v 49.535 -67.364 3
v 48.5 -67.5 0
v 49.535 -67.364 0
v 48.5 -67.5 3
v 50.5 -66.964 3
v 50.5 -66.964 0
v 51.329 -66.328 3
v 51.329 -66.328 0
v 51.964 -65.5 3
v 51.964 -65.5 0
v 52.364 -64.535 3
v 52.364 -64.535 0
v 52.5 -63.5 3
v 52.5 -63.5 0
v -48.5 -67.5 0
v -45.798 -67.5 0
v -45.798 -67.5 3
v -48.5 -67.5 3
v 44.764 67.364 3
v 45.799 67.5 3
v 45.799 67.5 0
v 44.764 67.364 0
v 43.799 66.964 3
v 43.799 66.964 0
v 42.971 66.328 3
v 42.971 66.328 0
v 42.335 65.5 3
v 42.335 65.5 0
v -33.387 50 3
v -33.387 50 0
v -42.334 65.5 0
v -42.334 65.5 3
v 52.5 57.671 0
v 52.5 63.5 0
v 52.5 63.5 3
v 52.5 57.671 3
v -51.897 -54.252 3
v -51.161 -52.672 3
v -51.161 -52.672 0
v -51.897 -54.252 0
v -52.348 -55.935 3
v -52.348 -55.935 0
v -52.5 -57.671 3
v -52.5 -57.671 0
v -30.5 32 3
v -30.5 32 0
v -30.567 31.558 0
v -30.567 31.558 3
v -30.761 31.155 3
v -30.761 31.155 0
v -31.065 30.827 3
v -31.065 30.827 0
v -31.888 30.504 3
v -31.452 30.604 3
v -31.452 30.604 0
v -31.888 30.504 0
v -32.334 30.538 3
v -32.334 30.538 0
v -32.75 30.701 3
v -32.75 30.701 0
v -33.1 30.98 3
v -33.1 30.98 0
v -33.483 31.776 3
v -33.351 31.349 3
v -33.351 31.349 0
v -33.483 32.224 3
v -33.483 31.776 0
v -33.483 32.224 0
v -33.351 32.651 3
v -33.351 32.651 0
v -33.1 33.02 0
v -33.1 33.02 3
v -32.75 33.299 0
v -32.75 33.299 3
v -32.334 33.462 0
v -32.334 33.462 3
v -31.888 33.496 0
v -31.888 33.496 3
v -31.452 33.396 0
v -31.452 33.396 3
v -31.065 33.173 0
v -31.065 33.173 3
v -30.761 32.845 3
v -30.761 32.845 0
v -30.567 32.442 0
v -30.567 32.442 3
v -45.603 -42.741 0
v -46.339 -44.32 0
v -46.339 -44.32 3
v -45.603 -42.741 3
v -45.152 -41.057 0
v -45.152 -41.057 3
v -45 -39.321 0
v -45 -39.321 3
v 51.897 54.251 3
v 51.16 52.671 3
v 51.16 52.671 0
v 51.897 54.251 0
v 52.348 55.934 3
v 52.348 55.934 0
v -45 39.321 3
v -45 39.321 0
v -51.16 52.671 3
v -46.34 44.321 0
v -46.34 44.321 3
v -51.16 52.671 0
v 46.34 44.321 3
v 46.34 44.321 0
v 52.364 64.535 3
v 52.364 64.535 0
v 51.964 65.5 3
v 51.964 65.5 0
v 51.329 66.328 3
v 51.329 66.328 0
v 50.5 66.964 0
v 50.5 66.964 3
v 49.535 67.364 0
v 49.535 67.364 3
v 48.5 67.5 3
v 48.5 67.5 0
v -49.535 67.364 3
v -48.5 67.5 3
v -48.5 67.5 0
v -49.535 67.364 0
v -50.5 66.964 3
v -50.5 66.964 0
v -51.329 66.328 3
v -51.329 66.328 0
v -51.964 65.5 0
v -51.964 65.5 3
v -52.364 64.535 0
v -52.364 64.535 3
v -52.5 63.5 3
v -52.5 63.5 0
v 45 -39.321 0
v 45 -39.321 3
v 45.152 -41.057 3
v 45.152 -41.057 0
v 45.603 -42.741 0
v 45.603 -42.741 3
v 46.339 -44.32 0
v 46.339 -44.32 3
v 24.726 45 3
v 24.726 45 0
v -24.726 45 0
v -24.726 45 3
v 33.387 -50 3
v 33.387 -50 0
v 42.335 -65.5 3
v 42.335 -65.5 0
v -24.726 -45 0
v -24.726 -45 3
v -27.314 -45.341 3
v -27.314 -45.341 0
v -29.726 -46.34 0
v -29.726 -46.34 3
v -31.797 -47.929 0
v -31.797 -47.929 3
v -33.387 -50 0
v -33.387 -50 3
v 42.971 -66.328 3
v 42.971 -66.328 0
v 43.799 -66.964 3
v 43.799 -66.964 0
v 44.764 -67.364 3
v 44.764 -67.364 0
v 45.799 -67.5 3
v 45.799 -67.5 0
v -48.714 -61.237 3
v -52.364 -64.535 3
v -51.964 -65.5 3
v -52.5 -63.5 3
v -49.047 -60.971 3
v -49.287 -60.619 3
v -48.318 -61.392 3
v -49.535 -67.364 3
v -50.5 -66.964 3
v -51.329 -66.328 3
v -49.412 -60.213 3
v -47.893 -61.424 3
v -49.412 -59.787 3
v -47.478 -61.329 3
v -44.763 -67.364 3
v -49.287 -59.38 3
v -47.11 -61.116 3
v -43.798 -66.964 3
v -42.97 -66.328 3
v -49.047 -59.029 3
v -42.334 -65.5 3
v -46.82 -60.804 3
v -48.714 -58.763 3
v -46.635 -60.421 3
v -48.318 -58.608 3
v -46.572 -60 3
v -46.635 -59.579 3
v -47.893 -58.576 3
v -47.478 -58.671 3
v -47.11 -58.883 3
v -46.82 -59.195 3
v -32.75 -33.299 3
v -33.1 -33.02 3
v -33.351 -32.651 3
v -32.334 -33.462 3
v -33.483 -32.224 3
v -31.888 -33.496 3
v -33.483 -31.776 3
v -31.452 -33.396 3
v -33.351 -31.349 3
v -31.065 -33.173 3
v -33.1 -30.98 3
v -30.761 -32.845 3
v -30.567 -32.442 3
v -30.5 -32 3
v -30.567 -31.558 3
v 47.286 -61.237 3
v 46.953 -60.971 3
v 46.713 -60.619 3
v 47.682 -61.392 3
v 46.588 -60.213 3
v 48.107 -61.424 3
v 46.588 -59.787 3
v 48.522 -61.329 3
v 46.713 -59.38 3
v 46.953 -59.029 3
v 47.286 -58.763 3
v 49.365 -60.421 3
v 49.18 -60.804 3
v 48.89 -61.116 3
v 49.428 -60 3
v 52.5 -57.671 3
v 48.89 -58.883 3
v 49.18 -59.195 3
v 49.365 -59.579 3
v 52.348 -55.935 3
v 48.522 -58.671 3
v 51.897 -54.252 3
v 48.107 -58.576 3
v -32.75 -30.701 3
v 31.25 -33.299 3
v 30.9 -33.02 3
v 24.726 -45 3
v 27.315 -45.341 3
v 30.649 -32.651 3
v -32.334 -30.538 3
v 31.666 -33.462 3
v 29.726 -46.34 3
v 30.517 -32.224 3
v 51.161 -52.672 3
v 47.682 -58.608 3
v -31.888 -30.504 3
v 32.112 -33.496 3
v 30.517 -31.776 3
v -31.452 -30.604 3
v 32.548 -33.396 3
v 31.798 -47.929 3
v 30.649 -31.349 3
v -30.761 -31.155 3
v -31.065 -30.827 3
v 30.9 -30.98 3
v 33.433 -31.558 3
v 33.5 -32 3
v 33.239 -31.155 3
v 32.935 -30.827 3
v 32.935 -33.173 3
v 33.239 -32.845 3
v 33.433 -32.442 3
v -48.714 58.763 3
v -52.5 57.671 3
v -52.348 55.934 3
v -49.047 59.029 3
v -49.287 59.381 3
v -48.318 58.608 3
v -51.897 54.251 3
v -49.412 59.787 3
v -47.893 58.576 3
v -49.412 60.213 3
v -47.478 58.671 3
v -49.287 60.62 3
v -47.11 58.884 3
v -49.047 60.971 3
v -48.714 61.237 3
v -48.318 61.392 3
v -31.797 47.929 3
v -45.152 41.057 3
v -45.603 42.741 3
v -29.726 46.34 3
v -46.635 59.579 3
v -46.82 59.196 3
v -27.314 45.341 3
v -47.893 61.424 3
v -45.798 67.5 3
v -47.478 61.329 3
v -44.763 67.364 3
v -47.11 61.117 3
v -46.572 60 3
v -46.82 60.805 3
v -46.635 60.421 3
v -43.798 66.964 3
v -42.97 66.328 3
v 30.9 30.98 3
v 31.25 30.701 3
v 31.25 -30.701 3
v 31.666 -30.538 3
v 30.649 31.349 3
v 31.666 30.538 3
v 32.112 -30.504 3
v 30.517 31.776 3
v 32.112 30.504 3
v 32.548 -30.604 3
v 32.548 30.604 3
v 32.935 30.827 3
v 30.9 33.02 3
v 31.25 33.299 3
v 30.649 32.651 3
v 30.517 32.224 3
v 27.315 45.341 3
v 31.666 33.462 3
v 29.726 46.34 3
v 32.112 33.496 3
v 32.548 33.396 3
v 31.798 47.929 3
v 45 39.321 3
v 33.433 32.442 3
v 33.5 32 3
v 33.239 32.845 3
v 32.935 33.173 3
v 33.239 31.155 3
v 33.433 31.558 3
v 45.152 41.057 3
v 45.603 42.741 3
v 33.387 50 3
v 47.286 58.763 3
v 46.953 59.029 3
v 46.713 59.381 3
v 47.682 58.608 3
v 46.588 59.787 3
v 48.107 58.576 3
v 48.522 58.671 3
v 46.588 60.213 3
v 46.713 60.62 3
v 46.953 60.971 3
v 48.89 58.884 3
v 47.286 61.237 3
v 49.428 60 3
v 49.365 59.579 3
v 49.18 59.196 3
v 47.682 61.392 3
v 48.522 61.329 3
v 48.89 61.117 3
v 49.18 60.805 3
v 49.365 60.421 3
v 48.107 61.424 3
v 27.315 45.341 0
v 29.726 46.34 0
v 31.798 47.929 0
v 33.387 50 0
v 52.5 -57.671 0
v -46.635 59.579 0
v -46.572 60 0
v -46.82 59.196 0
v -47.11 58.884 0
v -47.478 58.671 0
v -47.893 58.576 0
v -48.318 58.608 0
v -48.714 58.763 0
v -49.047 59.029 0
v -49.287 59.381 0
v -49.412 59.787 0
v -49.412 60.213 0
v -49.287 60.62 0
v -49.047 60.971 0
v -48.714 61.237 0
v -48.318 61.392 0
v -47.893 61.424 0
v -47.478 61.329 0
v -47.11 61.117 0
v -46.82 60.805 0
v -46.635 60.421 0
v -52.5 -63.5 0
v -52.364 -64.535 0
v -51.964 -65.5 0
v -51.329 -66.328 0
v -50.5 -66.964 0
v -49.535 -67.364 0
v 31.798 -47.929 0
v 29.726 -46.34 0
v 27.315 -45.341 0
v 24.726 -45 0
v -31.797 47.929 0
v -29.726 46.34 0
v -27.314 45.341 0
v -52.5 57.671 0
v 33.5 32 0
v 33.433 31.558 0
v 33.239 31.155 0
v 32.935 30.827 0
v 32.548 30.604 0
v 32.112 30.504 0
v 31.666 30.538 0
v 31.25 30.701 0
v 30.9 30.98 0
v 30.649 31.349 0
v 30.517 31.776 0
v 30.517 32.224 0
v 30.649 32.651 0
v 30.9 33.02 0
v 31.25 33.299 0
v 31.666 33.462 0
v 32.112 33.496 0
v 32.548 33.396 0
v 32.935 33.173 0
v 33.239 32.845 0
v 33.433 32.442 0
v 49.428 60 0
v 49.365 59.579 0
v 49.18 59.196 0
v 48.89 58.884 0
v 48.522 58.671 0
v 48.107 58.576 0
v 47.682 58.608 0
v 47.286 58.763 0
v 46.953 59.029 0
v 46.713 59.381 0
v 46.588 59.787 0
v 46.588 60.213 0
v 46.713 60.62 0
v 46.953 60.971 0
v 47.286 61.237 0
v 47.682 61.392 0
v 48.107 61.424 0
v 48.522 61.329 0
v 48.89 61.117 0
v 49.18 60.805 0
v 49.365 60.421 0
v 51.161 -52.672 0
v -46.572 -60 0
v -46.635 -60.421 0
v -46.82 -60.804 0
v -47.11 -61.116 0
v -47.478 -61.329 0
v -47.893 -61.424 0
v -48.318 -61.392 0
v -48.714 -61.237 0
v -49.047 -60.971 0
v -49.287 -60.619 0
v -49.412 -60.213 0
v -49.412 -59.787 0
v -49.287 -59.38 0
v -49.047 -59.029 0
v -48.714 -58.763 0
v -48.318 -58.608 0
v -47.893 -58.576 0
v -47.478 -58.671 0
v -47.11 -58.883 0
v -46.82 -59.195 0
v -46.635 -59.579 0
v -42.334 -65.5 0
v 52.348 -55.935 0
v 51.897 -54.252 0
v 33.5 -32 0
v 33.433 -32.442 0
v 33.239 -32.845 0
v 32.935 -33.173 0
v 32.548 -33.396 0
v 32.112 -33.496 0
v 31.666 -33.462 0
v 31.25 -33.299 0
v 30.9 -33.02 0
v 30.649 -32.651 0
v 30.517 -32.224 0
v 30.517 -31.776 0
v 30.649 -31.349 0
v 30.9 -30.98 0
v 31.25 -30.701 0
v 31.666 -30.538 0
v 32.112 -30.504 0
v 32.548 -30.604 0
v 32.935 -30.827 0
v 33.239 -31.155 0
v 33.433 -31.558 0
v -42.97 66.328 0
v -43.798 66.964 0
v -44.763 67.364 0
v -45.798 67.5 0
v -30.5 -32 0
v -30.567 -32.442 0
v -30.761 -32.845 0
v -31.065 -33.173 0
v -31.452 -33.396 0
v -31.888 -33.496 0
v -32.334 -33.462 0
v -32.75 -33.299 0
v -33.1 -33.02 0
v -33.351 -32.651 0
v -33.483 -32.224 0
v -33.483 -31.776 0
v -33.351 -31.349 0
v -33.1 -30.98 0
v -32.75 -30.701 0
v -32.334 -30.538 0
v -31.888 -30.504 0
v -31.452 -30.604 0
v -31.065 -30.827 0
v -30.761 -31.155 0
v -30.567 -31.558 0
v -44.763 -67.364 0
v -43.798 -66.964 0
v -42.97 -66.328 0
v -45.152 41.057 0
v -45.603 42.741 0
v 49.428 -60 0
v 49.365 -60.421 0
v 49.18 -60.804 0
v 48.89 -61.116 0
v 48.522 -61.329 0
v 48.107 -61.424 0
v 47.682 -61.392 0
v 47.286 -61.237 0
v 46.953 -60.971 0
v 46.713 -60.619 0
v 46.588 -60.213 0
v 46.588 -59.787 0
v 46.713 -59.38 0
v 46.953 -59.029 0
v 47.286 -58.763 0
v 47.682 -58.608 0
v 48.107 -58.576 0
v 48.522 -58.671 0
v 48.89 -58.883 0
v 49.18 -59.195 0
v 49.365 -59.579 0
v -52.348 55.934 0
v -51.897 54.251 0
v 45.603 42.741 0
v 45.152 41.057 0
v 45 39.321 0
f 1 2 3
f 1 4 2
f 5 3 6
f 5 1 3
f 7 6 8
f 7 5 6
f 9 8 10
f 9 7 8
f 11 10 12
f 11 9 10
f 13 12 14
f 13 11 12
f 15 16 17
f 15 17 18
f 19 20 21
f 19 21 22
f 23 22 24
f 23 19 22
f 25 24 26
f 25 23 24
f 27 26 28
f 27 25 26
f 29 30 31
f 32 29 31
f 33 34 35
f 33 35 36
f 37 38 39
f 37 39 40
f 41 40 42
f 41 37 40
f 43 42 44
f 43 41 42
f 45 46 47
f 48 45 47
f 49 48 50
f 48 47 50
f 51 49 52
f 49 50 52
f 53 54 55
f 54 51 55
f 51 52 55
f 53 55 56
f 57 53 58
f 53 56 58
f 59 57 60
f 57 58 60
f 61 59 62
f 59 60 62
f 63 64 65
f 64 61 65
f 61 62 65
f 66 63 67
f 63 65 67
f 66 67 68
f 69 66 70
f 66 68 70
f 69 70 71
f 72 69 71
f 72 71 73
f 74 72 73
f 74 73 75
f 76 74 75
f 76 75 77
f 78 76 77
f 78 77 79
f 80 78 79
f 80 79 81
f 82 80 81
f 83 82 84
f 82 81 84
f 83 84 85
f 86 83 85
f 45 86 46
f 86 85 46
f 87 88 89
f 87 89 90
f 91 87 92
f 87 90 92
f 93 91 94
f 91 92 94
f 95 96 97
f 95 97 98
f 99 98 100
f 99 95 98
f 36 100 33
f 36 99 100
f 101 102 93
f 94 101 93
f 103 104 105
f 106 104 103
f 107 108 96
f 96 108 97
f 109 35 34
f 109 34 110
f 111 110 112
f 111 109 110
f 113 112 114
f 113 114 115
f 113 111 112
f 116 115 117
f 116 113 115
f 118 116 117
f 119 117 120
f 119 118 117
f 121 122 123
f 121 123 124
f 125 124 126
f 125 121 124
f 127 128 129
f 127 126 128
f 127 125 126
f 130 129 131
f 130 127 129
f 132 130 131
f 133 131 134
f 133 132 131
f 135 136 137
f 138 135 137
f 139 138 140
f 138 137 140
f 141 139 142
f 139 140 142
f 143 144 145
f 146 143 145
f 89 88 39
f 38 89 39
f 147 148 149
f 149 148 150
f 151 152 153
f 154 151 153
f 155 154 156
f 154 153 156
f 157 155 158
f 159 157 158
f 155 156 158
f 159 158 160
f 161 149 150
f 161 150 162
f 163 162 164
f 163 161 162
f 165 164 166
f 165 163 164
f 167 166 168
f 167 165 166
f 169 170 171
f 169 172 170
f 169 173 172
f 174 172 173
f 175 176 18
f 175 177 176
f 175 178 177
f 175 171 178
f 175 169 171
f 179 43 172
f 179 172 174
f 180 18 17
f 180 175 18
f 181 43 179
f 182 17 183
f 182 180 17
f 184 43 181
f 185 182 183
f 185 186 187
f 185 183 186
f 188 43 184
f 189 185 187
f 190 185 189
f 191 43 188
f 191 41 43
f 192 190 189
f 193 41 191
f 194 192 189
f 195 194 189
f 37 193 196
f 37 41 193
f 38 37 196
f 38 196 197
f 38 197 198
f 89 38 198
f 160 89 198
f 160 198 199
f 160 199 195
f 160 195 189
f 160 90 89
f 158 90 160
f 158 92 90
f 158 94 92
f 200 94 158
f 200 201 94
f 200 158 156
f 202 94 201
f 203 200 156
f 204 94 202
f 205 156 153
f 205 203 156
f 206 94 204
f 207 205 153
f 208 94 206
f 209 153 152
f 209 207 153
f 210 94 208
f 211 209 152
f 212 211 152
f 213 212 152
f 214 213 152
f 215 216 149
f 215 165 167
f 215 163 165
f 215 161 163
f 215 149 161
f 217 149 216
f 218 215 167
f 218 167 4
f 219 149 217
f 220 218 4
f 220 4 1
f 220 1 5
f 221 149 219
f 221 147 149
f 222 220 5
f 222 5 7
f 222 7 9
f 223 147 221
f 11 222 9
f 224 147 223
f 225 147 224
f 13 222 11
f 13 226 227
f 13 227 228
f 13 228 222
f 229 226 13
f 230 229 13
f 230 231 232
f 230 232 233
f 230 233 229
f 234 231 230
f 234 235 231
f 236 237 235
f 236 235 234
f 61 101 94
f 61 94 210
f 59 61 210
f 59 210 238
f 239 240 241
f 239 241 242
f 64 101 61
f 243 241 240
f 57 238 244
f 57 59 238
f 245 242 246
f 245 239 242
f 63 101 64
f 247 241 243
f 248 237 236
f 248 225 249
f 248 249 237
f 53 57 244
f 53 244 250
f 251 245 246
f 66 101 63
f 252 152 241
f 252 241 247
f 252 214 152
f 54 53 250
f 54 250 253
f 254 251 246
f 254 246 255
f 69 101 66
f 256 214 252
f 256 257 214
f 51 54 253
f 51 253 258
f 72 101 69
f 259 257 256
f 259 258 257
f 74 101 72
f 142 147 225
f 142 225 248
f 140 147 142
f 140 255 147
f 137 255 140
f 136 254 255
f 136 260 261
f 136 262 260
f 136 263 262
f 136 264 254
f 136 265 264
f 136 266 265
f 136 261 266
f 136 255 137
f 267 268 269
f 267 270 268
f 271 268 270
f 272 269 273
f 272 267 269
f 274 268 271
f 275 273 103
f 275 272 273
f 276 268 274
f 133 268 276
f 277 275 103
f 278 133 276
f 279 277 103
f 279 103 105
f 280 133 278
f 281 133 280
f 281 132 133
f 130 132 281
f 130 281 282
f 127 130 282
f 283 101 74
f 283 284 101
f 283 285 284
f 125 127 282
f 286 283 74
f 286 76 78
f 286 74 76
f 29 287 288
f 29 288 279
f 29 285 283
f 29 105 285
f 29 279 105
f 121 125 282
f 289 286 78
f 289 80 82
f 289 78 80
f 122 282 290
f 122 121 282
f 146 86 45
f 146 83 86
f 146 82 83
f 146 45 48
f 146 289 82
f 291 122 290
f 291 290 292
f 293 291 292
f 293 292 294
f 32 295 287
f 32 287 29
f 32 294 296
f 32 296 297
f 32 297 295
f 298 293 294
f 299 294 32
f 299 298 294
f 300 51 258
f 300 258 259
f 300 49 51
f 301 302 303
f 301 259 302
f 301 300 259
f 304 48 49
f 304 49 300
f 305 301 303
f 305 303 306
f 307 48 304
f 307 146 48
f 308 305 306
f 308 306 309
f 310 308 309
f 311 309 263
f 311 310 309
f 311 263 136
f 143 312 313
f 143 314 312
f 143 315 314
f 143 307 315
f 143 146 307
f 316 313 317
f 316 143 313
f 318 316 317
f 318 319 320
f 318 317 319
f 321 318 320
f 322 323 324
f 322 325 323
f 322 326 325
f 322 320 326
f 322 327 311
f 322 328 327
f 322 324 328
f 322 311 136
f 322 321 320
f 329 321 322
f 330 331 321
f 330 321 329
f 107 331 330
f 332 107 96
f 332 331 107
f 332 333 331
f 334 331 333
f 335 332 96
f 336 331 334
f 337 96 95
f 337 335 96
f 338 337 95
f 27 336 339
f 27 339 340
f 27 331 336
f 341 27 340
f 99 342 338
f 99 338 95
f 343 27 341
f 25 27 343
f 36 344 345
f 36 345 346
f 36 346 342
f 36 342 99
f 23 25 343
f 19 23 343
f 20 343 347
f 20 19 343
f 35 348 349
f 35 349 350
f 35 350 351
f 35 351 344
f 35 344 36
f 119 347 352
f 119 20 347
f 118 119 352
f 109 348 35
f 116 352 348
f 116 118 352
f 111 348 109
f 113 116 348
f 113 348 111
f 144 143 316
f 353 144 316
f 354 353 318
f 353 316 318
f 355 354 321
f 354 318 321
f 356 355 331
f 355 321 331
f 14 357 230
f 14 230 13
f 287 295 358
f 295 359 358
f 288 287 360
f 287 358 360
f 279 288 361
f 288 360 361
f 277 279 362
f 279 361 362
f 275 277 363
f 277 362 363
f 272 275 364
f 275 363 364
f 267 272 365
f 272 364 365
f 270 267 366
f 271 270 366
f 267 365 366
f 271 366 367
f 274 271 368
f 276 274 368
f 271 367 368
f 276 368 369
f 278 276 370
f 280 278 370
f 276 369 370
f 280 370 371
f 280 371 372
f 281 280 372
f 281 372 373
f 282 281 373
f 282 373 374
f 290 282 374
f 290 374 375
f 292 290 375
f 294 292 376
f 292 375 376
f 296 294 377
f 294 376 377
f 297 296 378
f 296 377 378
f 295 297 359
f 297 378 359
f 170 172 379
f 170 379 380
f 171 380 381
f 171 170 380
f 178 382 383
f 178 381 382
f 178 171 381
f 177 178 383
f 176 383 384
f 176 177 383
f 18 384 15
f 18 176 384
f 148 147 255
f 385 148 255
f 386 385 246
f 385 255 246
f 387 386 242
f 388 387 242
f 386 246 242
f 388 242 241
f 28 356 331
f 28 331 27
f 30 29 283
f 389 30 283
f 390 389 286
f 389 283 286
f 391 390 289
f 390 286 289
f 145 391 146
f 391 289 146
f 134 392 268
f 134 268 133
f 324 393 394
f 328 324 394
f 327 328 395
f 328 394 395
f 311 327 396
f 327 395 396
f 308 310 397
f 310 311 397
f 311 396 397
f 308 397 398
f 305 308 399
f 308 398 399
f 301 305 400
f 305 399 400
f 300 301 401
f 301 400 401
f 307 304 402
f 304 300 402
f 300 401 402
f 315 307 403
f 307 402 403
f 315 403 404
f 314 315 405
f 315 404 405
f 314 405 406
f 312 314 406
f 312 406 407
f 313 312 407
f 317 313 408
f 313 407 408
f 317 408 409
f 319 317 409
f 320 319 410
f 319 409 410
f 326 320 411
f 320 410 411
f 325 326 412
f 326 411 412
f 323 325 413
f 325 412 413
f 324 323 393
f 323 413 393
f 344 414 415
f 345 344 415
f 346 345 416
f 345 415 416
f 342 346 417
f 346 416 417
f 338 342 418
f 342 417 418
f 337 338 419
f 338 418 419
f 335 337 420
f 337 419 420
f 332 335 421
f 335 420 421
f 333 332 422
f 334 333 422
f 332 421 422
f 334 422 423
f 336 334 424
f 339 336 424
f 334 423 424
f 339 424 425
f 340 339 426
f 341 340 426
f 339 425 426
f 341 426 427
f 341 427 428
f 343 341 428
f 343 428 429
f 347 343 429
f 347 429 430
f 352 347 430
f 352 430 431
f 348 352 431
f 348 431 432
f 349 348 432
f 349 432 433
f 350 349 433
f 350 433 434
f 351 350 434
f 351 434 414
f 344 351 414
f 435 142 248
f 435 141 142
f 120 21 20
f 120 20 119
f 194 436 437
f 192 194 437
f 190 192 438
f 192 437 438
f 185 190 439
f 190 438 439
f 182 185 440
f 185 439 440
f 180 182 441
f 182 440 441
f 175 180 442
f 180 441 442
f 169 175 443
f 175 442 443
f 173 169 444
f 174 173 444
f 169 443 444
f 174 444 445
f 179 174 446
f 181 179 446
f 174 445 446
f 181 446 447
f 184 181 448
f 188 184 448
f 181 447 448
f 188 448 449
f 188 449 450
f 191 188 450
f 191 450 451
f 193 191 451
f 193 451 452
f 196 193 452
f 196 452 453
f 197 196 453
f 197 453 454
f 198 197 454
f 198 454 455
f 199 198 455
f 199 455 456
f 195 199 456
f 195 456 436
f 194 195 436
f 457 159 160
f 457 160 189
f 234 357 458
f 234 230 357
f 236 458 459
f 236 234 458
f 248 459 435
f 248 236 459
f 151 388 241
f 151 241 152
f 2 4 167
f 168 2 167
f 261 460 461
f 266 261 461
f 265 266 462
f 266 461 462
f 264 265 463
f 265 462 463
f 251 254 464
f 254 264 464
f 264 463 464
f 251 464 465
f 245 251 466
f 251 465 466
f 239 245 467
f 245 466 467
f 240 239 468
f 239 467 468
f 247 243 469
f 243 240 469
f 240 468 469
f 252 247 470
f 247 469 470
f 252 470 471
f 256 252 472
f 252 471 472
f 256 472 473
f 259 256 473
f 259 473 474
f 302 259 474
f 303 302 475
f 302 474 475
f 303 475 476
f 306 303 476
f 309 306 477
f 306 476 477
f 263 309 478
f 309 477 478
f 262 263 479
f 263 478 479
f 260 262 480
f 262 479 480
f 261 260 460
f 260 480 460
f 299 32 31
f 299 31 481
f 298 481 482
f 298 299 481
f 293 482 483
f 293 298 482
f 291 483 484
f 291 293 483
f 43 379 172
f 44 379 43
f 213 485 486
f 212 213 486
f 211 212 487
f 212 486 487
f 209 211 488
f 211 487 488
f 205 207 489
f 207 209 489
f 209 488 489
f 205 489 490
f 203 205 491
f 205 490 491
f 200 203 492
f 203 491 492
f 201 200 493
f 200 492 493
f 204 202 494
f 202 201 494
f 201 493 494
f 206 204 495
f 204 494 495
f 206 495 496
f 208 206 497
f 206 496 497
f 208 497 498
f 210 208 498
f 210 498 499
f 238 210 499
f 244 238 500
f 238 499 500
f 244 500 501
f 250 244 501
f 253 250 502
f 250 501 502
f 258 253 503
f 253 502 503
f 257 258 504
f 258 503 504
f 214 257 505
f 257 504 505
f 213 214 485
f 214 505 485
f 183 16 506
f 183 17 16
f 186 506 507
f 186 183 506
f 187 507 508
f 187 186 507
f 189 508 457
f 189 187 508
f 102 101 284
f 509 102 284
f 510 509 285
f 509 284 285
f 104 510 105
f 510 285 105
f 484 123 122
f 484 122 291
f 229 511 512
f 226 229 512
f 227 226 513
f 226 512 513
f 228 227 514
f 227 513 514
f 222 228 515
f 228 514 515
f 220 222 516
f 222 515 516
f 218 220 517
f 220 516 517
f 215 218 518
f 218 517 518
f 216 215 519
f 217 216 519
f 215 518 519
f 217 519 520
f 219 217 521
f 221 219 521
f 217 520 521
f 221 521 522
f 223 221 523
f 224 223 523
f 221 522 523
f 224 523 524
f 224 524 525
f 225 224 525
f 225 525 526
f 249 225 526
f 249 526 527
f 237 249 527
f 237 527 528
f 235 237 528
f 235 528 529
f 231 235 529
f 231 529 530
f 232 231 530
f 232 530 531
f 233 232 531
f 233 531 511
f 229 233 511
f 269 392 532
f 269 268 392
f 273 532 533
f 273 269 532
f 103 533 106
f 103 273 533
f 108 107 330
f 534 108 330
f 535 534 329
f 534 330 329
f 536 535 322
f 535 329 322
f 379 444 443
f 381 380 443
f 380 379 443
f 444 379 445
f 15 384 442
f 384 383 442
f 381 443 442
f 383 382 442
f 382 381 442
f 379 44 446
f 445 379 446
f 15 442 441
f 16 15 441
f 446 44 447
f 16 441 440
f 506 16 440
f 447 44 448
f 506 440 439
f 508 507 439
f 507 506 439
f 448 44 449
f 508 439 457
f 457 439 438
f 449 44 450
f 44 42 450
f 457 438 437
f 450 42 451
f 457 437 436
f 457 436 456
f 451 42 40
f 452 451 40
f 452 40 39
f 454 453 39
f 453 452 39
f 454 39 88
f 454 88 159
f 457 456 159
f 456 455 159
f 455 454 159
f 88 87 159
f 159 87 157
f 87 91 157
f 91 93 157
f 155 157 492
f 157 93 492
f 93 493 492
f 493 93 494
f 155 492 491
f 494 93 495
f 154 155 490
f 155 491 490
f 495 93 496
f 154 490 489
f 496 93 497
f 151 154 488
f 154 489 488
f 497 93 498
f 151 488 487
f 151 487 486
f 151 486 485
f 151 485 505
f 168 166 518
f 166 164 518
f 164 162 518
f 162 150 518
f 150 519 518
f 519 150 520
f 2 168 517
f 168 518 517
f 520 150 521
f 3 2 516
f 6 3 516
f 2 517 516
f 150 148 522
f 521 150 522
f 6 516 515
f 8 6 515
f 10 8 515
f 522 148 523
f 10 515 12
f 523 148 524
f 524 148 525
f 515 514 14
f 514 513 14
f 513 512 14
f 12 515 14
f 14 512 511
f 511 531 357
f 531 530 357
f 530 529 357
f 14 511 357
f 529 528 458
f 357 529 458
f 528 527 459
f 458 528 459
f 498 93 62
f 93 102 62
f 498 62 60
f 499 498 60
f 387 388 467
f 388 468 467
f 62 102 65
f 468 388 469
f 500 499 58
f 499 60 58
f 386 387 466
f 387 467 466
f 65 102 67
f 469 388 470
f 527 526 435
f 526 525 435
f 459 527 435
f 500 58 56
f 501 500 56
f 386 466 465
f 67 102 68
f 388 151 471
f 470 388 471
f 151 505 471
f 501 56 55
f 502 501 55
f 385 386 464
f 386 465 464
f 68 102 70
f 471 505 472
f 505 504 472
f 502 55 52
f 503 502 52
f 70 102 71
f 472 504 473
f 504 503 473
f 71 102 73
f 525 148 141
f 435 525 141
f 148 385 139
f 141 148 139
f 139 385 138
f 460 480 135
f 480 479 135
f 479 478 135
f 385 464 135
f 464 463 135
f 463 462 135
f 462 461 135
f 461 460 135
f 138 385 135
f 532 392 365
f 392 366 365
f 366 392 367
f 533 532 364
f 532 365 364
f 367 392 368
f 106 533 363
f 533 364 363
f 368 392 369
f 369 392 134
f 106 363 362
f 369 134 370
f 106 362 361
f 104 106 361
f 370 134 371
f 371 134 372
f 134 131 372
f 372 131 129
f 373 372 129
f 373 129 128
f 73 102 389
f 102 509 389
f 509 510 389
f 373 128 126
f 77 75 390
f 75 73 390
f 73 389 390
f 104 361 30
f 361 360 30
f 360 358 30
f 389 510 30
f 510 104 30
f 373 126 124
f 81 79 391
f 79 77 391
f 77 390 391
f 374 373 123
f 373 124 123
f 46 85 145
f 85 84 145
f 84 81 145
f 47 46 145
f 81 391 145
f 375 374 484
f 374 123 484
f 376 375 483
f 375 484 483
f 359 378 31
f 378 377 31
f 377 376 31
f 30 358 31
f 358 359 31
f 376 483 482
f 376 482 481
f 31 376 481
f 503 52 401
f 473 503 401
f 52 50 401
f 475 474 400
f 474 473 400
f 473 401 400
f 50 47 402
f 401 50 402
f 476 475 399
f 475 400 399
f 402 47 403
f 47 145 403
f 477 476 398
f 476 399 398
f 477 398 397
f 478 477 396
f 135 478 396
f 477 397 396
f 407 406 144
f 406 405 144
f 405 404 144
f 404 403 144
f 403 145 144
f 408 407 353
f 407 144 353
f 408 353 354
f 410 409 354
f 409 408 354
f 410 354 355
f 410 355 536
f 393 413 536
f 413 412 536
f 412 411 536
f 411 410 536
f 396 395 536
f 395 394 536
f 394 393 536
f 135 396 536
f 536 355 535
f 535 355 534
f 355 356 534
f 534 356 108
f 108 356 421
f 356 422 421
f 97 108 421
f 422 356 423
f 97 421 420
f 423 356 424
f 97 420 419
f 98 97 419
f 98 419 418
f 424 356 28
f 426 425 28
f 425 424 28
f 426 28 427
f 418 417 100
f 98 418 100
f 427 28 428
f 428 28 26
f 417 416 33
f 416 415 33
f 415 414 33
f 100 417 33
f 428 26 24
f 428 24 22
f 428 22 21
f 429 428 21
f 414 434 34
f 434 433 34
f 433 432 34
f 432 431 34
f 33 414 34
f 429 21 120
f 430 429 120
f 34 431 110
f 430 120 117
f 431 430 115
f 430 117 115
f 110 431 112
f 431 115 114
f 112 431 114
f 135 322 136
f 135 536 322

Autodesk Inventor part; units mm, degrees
ref_plane "YZ Plane" through (0, 0, 0) normal (1, 0, 0) x (0, 1, 0)
ref_plane "XZ Plane" through (0, 0, 0) normal (0, 1, 0) x (-1, 0, 0)
ref_plane "XY Plane" through (0, 0, 0) normal (0, 0, 1) x (1, 0, 0)
sketch "Sketch3" plane through (0, 0, 0) normal (0, 0, 1) x (1, 0, 0)
  line L0 (52.5001, -67.5) -> (-52.5001, -67.5)
  line L1 (-52.5001, -67.5) -> (-52.5001, 67.5)
  line L2 (-52.5001, 67.5) -> (52.5001, 67.5)
  line L3 (52.5001, 67.5) -> (52.5001, -67.5)
  circle A0 centre (32, 32) radius 1.5
  circle A1 centre (-32, 32) radius 1.5
  circle A2 centre (-32, -32) radius 1.5
  circle A3 centre (32, -32) radius 1.5
  line L4 (30.5, 0) -> (-30.5, 0)
  line L5 (30.5, 45) -> (-30.5, 45)
  line L6 (30.5, 45) -> (43.4898, 67.5)
  line L7 (-30.5, 45) -> (-43.4888, 67.5)
  line L8 (30.5, -45) -> (-30.5, -45)
  line L9 (30.5, -45) -> (43.4898, -67.5)
  line L10 (-30.5, -45) -> (-43.4888, -67.5)
  line L11 (0, 42.0002) -> (0, -42)
  line L12 (45, 42.0002) -> (45, -42)
  line L13 (45, 42.0002) -> (52.5001, 54.9914)
  line L14 (45, -42) -> (52.5001, -54.9922)
  line L15 (-45, 42.0002) -> (-45, -42)
  line L16 (-45, 42.0002) -> (-52.5001, 54.9914)
  line L17 (-45, -42) -> (-52.5001, -54.9922)
  circle A4 centre (48, 60.0001) radius 1.428
  circle A5 centre (-48, 60.0001) radius 1.428
  circle A6 centre (48, -59.9999) radius 1.428
  circle A7 centre (-48, -59.9999) radius 1.428
extrude "Extrusion2" add sketch "Sketch3" along normal blind 3 contours L0 L9 L8 L10 L1 L17 L15 L16 L2 L7 L5 L6 L3 L13 L12 L14 | L0 L10 L8 L9 | L14 L12 L13 L3 | L1 L16 L15 L17 | L6 L5 L7 L2 | A4 | A5 | A6 | A7
fillet "Fillet2" radius 4 4 edges at (-52.5001, 67.5, 1.5) (52.5001, 67.5, 1.5) (52.5001, -67.5, 1.5) (-52.5001, -67.5, 1.5)
extrude "Extrusion3" cut sketch "Sketch3" along normal blind 10 contours L0 L10 L8 L9 | L14 L12 L13 L3 | L1 L16 L15 L17 | L6 L5 L7 L2
fillet "Fillet3" radius 10 8 edges at (30.5, 45, 1.5) (-30.5, 45, 1.5) (30.5, -45, 1.5) (-30.5, -45, 1.5) (-52.5001, 54.9914, 1.5) (52.5001, -54.9922, 1.5) (-52.5001, -54.9922, 1.5) (52.5001, 54.9914, 1.5)
fillet "Fillet4" radius 10 4 edges at (45, 42.0002, 1.5) (45, -42, 1.5) (-45, -42, 1.5) (-45, 42.0002, 1.5)
fillet "Fillet5" radius 4 4 edges at (43.4898, 67.5, 1.5) (-43.4888, 67.5, 1.5) (43.4898, -67.5, 1.5) (-43.4888, -67.5, 1.5)
extrude "Extrusion4" cut sketch "Sketch3" along normal blind 10 contours A4 | A5 | A6 | A7
properties part number "GPS - mount v2"
